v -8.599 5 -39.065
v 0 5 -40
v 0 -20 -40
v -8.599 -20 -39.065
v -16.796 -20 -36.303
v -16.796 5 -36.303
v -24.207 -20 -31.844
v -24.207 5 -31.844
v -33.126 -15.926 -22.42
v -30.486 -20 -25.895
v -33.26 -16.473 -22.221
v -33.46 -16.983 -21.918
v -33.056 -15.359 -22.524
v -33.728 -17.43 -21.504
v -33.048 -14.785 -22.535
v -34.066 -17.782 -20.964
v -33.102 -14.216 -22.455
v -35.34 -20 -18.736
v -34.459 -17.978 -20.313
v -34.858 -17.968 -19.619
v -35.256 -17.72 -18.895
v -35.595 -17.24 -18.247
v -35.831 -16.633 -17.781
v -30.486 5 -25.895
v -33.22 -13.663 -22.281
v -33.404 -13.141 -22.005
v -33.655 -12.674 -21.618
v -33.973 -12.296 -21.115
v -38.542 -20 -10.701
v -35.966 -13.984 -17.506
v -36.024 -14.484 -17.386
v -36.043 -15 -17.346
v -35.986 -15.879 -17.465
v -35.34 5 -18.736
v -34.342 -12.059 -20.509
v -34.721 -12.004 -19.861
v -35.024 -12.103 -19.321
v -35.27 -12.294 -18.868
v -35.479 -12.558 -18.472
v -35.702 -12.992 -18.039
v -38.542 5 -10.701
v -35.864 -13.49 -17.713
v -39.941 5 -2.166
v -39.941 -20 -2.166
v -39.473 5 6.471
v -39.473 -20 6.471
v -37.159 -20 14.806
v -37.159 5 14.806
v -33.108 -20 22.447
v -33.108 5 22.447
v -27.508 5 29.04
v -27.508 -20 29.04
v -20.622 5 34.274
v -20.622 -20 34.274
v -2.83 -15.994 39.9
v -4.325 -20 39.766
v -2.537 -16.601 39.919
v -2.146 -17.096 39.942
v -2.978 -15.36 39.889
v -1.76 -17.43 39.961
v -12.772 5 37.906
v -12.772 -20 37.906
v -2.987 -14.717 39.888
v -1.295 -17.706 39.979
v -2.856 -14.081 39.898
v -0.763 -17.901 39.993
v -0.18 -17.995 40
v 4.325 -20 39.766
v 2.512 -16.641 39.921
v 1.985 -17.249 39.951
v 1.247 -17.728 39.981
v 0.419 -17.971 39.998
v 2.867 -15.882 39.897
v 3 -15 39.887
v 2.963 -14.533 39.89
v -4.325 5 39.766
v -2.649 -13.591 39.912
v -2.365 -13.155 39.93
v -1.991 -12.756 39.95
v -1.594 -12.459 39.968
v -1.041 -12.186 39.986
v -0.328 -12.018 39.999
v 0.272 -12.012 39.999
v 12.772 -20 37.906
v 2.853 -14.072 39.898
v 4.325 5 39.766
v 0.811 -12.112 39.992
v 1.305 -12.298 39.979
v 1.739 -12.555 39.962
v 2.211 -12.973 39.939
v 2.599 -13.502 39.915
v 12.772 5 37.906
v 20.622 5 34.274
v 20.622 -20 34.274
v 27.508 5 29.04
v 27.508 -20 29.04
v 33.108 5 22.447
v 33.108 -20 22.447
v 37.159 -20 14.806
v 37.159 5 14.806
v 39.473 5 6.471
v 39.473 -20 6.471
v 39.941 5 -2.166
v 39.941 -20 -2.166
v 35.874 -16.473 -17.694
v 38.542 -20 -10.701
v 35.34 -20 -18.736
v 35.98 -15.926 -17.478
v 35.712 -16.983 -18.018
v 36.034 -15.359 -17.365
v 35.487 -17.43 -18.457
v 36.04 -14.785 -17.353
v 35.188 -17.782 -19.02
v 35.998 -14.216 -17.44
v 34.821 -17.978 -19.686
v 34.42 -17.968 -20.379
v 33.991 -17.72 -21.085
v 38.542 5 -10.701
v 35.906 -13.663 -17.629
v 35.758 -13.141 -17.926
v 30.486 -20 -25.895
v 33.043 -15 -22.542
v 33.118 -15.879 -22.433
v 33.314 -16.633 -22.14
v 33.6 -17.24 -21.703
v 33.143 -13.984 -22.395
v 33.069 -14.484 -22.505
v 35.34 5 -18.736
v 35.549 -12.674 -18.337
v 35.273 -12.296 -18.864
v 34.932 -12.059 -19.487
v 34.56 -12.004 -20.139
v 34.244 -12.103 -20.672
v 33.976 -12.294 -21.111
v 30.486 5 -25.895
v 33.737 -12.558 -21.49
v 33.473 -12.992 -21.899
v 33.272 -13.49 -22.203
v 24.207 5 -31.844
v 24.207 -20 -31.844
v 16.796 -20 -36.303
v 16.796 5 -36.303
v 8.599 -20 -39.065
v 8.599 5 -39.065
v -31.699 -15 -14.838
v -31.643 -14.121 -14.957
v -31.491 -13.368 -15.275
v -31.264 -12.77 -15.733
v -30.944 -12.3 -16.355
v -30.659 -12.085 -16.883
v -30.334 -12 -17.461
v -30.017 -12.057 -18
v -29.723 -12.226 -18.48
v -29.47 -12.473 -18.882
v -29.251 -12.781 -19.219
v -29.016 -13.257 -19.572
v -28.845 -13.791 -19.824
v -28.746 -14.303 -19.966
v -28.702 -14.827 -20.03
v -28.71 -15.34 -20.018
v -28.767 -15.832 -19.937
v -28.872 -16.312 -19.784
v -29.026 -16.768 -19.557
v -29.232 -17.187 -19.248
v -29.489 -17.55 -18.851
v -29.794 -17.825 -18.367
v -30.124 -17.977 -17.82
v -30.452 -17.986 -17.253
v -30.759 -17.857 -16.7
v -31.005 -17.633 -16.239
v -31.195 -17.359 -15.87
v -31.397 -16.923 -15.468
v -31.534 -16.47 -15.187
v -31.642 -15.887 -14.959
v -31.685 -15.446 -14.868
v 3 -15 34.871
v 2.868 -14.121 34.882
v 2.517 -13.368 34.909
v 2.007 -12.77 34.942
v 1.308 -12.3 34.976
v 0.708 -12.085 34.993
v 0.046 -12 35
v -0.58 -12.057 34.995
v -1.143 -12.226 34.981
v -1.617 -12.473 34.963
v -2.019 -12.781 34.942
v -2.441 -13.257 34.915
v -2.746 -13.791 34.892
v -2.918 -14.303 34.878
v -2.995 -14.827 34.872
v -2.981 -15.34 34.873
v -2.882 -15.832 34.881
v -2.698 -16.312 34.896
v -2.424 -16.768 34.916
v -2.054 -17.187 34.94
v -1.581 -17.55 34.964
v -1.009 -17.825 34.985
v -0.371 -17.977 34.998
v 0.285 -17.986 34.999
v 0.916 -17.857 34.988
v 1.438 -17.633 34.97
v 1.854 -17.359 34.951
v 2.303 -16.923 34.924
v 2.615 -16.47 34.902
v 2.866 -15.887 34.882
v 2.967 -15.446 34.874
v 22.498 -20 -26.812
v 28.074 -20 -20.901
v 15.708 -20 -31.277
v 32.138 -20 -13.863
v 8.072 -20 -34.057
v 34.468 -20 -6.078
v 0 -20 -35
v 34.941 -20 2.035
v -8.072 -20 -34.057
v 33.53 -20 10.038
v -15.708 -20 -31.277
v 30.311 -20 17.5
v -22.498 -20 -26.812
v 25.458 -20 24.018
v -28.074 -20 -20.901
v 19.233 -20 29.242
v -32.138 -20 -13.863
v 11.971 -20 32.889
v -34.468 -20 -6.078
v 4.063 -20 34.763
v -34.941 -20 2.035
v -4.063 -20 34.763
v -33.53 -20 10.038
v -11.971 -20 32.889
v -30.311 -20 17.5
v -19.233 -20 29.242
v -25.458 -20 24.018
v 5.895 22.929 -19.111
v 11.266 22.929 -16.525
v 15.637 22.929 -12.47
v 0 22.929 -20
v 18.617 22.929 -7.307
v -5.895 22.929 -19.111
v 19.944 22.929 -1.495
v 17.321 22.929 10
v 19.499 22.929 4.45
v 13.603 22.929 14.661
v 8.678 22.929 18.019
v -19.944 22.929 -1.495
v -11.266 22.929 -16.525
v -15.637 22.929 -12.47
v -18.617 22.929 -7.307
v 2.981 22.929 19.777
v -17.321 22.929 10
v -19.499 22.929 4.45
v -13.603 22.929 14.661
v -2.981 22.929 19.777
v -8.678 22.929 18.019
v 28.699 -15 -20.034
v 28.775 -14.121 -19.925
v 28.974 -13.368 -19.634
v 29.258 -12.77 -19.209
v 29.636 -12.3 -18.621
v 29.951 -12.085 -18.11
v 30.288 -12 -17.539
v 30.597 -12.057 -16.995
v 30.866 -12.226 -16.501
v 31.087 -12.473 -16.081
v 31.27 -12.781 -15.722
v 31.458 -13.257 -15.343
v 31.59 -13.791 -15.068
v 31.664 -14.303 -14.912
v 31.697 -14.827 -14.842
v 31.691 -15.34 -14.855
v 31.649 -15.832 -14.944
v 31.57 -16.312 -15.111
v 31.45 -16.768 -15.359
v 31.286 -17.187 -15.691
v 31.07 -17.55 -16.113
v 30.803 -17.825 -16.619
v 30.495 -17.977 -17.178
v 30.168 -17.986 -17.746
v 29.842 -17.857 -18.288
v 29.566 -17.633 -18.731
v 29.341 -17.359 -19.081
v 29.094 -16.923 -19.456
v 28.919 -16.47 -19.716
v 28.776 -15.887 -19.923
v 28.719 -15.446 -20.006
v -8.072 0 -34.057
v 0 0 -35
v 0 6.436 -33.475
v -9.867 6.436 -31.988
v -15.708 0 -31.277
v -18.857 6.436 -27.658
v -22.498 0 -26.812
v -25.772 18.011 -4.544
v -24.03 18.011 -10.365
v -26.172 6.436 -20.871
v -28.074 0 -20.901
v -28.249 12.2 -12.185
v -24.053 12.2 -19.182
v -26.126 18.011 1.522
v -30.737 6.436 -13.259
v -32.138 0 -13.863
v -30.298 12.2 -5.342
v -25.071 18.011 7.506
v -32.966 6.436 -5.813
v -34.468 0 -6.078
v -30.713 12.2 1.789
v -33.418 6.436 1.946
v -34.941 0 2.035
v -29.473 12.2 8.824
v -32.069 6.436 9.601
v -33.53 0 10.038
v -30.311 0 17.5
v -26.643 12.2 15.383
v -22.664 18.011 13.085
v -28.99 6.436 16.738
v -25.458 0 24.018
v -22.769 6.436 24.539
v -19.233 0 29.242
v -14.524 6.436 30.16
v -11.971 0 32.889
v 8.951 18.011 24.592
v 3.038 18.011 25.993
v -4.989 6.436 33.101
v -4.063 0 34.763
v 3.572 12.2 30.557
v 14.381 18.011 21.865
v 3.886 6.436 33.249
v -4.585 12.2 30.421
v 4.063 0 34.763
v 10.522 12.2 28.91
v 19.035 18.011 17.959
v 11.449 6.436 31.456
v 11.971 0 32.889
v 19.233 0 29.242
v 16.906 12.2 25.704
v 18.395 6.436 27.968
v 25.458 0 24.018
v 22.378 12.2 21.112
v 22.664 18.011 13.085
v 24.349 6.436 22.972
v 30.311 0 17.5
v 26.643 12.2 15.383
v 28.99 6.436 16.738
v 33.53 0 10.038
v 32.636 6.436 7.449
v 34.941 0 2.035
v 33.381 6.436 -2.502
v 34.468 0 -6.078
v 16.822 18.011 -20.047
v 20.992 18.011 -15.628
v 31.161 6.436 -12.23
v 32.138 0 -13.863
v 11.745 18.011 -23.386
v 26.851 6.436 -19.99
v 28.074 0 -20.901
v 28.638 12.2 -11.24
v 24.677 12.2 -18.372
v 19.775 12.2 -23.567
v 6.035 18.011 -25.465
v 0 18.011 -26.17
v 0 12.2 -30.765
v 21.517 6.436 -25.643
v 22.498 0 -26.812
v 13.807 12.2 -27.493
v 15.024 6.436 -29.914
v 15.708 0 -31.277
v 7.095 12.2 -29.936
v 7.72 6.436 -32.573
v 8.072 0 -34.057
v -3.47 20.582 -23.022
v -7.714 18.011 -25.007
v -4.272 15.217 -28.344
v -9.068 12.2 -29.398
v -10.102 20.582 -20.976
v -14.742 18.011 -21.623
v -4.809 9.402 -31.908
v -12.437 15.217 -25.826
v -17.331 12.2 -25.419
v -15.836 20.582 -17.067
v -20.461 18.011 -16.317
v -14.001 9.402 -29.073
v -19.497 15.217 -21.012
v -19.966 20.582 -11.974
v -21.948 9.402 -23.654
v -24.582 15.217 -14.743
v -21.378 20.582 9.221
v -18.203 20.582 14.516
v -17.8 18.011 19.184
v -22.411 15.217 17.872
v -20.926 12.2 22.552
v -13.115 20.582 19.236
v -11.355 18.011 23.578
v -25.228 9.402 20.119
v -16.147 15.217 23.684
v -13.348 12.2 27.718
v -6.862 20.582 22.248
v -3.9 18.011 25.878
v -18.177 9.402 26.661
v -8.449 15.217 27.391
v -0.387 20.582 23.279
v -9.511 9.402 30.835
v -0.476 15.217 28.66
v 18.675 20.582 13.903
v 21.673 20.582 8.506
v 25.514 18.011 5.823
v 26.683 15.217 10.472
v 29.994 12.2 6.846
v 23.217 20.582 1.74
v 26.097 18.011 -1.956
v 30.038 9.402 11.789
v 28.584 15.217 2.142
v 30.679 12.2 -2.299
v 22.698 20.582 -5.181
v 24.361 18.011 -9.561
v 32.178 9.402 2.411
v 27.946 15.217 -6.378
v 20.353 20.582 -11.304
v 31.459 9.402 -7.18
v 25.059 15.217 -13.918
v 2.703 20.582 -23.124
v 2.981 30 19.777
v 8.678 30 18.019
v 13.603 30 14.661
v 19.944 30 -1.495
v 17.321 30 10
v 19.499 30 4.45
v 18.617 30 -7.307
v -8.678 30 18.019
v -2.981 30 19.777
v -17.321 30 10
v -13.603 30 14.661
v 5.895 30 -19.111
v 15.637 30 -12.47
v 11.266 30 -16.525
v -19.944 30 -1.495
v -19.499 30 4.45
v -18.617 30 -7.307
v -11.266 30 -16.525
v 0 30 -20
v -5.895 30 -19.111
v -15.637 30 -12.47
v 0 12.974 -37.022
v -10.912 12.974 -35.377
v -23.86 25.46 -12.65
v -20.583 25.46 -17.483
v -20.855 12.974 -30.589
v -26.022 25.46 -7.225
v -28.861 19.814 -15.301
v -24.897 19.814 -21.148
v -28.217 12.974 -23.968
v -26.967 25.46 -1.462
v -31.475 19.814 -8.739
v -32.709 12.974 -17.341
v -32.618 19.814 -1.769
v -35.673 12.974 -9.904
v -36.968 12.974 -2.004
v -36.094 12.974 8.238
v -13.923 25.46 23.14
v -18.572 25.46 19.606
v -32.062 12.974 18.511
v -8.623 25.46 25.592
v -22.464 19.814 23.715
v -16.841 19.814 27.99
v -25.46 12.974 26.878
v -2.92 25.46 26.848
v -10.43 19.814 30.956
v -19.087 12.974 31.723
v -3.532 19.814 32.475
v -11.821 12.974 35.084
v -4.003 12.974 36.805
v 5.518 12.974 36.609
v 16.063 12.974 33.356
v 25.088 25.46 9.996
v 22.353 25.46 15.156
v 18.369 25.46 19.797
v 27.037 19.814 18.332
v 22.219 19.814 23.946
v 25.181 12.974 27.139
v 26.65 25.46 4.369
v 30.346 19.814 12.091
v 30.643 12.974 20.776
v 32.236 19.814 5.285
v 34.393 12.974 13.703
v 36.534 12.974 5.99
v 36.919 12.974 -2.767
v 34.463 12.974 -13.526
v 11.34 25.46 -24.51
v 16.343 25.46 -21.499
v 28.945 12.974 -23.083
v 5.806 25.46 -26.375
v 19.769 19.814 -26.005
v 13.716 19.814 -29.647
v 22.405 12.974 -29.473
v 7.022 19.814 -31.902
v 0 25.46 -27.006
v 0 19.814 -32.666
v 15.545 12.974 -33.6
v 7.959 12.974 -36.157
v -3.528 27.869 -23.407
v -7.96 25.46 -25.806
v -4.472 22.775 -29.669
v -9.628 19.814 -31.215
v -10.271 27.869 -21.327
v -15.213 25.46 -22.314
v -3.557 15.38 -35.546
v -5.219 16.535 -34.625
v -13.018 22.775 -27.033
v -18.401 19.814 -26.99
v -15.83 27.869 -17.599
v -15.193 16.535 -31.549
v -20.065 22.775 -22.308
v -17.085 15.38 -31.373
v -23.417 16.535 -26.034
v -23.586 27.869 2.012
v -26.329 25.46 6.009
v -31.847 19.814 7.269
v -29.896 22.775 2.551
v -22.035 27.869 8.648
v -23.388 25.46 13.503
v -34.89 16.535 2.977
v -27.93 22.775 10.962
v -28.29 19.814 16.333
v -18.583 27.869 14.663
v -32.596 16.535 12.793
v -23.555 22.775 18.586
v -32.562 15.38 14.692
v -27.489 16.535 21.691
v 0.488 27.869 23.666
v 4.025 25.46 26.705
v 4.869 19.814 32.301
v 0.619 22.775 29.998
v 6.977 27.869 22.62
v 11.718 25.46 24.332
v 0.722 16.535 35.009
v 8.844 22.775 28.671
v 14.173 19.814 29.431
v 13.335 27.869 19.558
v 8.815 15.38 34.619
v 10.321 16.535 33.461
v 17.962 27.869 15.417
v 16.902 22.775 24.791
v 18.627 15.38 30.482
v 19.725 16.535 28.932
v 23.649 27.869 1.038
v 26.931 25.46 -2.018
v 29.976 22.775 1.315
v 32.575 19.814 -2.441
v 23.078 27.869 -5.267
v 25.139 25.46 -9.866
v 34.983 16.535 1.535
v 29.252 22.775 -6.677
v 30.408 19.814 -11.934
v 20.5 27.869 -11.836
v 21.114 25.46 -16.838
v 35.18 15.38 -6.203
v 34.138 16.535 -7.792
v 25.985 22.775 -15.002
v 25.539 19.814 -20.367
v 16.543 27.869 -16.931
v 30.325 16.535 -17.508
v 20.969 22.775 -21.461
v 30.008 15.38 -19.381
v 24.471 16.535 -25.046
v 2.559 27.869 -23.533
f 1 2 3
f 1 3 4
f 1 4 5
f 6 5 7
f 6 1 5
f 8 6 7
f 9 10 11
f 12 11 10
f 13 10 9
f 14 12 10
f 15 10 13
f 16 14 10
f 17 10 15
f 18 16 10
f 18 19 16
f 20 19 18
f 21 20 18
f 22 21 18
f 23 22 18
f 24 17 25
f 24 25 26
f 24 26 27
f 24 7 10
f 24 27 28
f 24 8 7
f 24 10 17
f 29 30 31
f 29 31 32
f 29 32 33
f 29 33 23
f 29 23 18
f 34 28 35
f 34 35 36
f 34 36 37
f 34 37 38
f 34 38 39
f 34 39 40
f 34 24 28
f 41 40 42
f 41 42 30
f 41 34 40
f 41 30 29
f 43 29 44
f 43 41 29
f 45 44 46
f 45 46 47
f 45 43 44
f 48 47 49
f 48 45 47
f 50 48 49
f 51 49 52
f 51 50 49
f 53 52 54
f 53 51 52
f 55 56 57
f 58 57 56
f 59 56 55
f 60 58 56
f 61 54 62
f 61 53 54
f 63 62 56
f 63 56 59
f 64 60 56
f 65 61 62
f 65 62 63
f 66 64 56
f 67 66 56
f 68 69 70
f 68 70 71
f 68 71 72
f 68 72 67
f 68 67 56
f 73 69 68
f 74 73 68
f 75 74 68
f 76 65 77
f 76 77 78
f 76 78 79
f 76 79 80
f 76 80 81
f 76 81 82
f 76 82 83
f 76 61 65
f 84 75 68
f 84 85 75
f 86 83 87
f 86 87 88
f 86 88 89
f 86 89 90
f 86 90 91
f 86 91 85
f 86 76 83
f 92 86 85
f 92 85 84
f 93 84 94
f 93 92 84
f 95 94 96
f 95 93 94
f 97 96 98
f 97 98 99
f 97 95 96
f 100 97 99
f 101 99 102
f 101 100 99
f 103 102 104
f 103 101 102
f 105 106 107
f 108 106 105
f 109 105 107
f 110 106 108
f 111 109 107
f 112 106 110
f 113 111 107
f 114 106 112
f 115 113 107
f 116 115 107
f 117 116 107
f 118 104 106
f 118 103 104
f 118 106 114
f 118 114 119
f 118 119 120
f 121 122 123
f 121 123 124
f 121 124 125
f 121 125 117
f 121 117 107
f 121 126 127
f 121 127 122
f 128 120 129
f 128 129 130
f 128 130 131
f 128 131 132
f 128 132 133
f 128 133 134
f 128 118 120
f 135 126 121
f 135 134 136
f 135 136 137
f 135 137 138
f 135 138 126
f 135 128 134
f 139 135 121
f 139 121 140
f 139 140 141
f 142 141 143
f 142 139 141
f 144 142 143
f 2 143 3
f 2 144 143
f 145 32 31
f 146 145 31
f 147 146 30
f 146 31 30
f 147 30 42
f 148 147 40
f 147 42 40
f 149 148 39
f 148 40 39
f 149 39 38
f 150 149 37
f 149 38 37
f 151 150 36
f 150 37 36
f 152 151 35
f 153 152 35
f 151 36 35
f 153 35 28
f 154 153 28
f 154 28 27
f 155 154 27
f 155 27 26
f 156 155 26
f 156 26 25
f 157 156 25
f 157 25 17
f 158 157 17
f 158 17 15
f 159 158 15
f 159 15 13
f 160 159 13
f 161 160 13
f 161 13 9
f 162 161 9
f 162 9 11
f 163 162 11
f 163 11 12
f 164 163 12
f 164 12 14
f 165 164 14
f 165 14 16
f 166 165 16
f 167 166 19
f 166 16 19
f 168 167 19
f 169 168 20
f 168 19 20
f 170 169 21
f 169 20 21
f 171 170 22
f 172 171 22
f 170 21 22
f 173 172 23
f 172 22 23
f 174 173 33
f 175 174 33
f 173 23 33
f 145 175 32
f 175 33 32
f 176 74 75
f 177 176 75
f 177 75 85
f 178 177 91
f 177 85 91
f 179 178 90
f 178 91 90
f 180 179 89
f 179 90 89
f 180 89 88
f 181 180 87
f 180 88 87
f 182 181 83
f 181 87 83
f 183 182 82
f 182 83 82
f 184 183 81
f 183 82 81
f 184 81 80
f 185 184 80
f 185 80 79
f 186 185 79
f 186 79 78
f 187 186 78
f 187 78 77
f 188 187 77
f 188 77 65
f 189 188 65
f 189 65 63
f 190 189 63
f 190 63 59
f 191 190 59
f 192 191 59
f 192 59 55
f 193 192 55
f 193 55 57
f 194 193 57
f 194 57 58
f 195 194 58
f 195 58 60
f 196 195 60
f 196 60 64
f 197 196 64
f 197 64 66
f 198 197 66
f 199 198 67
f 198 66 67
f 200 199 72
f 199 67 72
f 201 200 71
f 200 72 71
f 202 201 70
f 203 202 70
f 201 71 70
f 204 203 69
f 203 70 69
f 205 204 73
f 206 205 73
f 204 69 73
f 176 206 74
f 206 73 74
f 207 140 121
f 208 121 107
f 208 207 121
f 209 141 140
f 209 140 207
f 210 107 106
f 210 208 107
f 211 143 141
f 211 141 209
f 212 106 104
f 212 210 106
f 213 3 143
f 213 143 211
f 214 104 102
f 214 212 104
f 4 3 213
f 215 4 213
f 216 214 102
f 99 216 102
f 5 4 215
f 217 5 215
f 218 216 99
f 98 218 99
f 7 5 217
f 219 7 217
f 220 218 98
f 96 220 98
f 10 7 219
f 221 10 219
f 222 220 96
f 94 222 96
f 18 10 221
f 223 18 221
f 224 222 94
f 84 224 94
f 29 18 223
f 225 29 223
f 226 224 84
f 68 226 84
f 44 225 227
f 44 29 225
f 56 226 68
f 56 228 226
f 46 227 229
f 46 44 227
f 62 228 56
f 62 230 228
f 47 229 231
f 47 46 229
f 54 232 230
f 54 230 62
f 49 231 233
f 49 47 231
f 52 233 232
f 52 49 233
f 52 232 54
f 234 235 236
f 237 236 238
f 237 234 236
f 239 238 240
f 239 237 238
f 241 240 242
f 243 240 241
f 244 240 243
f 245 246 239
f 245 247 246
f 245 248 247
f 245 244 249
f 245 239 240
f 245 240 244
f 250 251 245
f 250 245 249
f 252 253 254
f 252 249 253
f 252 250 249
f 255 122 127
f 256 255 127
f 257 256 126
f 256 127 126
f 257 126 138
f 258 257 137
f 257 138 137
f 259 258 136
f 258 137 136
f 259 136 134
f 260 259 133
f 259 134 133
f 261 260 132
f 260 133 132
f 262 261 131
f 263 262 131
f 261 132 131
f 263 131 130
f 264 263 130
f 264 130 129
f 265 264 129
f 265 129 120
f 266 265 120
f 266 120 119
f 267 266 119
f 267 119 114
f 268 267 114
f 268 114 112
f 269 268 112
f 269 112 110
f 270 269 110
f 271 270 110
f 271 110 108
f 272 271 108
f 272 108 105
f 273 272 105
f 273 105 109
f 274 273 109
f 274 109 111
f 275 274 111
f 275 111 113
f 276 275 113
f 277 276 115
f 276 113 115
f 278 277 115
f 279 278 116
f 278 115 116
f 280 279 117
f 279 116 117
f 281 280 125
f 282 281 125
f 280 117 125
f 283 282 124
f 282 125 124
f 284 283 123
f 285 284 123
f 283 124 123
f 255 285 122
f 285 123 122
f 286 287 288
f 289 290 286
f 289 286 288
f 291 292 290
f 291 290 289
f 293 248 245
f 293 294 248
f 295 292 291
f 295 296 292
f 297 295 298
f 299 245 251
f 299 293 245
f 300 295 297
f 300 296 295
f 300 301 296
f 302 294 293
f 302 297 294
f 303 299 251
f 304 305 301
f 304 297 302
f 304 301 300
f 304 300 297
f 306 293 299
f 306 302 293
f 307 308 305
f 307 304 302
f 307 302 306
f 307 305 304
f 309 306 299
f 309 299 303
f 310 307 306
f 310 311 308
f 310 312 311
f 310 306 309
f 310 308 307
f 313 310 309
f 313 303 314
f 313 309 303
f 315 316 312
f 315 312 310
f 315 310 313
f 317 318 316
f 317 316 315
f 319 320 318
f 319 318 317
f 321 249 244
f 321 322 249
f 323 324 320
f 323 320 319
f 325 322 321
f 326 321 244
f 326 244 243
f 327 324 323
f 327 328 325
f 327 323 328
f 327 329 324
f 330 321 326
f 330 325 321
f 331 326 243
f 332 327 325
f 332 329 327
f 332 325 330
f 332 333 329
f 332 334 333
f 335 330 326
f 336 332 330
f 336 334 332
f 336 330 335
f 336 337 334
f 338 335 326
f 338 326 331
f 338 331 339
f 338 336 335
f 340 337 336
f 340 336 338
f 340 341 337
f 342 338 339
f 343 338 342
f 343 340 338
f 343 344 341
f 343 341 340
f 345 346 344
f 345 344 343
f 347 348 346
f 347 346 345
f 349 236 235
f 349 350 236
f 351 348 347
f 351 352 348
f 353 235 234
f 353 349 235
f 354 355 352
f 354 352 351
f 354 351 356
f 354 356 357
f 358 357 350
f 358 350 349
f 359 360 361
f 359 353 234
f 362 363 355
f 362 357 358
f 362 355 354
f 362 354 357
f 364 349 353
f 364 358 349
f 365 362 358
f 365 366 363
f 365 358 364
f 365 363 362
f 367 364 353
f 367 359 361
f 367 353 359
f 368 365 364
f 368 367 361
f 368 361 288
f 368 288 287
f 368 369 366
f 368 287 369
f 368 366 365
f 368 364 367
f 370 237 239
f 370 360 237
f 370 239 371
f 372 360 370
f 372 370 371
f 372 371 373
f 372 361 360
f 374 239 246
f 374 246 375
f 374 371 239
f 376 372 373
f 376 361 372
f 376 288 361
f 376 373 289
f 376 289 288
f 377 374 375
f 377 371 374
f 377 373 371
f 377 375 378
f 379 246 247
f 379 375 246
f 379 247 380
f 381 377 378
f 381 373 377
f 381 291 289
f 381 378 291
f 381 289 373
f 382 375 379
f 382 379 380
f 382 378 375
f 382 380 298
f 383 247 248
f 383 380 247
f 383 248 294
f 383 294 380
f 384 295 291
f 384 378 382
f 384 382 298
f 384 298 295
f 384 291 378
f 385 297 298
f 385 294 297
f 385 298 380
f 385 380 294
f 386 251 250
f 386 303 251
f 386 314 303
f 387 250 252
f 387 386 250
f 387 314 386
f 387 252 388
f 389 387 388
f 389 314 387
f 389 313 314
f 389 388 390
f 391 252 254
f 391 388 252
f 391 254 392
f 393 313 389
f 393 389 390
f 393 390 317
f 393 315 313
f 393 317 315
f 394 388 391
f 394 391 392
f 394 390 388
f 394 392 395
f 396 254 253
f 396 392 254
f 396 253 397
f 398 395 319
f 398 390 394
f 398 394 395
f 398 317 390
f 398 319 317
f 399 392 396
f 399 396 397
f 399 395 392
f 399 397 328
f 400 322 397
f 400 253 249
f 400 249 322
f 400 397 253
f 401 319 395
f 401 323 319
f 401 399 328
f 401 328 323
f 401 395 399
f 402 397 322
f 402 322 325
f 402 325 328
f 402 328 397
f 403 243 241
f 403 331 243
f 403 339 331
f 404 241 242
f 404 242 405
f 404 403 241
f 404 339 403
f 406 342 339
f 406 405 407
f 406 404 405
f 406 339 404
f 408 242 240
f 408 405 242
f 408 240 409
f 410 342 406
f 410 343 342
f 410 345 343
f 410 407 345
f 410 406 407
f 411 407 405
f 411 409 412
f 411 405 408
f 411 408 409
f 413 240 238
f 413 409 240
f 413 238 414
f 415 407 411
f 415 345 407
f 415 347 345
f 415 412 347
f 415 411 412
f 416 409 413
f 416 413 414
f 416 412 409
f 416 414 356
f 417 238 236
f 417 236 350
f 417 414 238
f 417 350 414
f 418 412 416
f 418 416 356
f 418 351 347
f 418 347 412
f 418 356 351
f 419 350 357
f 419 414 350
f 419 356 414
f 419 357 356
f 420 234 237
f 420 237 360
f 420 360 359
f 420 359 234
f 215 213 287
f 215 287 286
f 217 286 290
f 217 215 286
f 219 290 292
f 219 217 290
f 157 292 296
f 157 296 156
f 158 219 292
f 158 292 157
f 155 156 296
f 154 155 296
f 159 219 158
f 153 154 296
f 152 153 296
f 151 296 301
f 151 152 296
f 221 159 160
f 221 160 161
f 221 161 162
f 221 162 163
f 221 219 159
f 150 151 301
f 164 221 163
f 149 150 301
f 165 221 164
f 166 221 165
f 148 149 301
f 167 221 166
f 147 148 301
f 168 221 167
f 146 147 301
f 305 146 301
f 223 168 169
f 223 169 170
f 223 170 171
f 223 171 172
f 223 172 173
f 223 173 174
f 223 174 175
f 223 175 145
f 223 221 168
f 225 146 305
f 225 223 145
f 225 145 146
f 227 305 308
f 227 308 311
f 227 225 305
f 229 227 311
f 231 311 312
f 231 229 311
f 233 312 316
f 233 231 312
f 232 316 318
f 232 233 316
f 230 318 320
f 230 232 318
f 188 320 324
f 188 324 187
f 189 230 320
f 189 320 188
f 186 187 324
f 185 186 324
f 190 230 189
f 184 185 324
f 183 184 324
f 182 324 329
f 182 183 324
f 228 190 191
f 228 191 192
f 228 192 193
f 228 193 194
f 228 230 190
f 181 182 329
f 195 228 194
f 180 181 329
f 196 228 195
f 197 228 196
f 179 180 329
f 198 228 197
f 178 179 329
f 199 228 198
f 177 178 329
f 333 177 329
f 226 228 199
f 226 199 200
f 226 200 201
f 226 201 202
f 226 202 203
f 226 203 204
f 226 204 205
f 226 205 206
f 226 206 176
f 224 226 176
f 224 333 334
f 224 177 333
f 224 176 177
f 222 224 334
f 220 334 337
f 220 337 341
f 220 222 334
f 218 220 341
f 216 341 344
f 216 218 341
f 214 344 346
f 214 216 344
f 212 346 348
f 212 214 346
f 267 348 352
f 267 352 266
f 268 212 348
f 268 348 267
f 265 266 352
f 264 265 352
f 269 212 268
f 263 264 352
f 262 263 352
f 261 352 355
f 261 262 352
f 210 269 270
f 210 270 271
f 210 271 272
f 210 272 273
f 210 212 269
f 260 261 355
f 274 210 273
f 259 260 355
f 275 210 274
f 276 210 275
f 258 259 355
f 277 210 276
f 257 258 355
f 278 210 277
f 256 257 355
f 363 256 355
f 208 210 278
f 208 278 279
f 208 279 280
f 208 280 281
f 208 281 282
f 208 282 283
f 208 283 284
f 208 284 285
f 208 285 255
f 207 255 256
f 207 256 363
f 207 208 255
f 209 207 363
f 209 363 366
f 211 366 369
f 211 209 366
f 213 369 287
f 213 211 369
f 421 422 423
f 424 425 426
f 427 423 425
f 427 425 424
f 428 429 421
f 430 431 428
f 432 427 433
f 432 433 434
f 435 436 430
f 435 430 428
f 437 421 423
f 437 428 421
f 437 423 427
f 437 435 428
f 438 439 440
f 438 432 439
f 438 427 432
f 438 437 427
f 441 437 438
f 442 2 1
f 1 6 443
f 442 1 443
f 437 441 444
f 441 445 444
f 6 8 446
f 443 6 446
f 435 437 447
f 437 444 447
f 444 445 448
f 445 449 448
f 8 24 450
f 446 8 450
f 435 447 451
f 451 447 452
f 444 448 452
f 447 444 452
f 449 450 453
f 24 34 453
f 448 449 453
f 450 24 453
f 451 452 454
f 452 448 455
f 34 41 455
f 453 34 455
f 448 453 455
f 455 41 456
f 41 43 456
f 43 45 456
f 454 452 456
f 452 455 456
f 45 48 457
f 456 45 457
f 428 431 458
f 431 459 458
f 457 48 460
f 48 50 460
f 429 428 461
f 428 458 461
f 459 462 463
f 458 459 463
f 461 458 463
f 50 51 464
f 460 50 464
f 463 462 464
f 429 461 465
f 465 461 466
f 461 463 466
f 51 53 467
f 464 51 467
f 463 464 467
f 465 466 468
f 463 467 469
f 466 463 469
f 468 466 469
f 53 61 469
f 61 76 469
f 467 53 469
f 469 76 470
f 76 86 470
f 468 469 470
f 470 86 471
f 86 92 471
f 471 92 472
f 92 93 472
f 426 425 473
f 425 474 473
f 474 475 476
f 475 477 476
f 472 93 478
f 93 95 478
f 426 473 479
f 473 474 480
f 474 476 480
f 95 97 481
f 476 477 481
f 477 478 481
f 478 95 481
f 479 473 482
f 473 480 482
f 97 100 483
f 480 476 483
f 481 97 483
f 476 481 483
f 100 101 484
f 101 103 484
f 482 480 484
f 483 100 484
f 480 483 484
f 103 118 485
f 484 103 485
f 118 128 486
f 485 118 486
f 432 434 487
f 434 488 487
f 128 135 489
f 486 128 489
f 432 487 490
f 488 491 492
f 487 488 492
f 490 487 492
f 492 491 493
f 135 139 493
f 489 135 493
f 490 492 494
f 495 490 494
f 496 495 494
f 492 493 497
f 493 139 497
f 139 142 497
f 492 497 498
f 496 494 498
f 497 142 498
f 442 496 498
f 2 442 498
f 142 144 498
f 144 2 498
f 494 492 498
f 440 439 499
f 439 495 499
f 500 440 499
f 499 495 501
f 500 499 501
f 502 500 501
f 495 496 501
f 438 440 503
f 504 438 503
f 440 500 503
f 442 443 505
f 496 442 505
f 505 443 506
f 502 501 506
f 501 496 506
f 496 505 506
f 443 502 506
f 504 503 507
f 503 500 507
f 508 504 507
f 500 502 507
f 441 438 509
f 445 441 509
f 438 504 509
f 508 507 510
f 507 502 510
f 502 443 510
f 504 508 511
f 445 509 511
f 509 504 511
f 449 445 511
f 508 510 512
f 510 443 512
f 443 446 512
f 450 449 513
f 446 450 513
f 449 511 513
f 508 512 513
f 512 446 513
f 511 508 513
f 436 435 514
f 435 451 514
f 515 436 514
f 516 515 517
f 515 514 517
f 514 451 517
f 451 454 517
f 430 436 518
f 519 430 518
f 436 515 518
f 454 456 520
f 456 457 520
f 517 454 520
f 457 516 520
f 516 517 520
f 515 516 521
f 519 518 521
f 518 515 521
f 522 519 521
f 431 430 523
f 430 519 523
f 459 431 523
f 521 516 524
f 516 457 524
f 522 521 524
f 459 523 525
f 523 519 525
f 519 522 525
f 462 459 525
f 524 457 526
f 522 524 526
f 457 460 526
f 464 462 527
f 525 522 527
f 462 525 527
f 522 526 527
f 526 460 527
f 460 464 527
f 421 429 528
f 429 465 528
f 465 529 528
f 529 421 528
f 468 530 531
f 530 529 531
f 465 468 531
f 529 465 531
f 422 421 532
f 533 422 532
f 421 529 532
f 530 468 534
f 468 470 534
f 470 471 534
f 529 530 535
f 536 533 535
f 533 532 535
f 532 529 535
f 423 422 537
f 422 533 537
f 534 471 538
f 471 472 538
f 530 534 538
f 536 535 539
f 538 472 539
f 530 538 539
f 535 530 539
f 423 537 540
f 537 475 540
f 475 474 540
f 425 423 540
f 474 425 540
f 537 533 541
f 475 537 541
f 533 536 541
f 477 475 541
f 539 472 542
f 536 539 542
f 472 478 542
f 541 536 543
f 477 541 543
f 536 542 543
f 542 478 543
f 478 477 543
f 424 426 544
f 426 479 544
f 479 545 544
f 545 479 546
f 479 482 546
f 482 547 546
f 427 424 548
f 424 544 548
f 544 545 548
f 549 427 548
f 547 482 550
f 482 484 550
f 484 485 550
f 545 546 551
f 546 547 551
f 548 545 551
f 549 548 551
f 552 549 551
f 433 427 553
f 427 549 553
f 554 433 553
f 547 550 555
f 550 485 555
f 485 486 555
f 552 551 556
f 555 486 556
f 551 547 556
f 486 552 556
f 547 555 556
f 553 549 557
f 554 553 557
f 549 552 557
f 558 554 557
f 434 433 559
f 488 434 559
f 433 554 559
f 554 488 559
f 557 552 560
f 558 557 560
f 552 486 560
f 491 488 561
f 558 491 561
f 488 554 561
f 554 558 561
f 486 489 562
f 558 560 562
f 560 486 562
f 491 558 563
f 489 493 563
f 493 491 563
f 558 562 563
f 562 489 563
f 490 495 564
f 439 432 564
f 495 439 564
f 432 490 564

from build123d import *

# Parameters (mm, degrees)
CUT_EXTRUDE1_REACH      = 96.34
CUT_EXTRUDE1_END_RADIUS = 35
SKETCH2_R               = 3
CIRPATTERN1_COUNT       = 3


with BuildPart() as part:
    # Sketch1 → Revolve1 (revolve)
    with BuildSketch(Plane.XY, mode=Mode.PRIVATE) as revolve1_sk:
        with BuildLine():
            Line((-20, 30), (0, 30))
            Line((0, 30), (0, 22.928932188))
            Line((0, 22.928932188), (-20, 22.928932188))
            add(Edge.make_bspline(
                [(-20, 22.928932188), (-32.99251078, 14.579736434), (-35, 0)],
                knots=[0, 0, 0, 1, 1, 1], degree=2))
            Line((-35, 0), (-35, -20))
            Line((-35, -20), (-40, -20))
            Line((-40, -20), (-40, 0))
            Line((-40, 0), (-40, 5))
            add(Edge.make_bspline(
                [(-20, 30), (-35.448934618, 21.981430701), (-40, 5)],
                knots=[0, 0, 0, 1, 1, 1], degree=2))
        make_face()
    revolve(revolve1_sk.sketch.rotate(Axis((0, -63.953488372, 0), (0, 1, 0)), 270), axis=Axis((0, -63.953488372, 0), (0, 1, 0)))

    # Cut-Extrude1: up to this cylinder (the profile starts outside it)
    cut_extrude1_end = Plane(origin=(0, -15, 0), z_dir=(0, -1, 0)) * Cylinder(CUT_EXTRUDE1_END_RADIUS, 263.68, mode=Mode.PRIVATE)
    # Sketch2 → Cut-Extrude1 (cut, up to the surface)
    with BuildSketch(Plane.XY.offset(40), mode=Mode.PRIVATE) as cut_extrude1_sk1:
        with Locations((0, -15)):
            Circle(SKETCH2_R)
    cut_extrude1_tool1 = extrude(cut_extrude1_sk1.sketch, amount=-CUT_EXTRUDE1_REACH, mode=Mode.PRIVATE) - cut_extrude1_end
    cut_extrude1 = cut_extrude1_tool1.solids().sort_by_distance((0, -15, 40))[0]
    add(cut_extrude1, mode=Mode.SUBTRACT)

    # CirPattern1: Cut-Extrude1 ×3 about axis
    cirpattern1_axis = Axis((0, 5, 0), (0, -1, 0))
    for i in range(1, CIRPATTERN1_COUNT):
        add(cut_extrude1.rotate(cirpattern1_axis, i * 360 / CIRPATTERN1_COUNT), mode=Mode.SUBTRACT)


solid = part.part
